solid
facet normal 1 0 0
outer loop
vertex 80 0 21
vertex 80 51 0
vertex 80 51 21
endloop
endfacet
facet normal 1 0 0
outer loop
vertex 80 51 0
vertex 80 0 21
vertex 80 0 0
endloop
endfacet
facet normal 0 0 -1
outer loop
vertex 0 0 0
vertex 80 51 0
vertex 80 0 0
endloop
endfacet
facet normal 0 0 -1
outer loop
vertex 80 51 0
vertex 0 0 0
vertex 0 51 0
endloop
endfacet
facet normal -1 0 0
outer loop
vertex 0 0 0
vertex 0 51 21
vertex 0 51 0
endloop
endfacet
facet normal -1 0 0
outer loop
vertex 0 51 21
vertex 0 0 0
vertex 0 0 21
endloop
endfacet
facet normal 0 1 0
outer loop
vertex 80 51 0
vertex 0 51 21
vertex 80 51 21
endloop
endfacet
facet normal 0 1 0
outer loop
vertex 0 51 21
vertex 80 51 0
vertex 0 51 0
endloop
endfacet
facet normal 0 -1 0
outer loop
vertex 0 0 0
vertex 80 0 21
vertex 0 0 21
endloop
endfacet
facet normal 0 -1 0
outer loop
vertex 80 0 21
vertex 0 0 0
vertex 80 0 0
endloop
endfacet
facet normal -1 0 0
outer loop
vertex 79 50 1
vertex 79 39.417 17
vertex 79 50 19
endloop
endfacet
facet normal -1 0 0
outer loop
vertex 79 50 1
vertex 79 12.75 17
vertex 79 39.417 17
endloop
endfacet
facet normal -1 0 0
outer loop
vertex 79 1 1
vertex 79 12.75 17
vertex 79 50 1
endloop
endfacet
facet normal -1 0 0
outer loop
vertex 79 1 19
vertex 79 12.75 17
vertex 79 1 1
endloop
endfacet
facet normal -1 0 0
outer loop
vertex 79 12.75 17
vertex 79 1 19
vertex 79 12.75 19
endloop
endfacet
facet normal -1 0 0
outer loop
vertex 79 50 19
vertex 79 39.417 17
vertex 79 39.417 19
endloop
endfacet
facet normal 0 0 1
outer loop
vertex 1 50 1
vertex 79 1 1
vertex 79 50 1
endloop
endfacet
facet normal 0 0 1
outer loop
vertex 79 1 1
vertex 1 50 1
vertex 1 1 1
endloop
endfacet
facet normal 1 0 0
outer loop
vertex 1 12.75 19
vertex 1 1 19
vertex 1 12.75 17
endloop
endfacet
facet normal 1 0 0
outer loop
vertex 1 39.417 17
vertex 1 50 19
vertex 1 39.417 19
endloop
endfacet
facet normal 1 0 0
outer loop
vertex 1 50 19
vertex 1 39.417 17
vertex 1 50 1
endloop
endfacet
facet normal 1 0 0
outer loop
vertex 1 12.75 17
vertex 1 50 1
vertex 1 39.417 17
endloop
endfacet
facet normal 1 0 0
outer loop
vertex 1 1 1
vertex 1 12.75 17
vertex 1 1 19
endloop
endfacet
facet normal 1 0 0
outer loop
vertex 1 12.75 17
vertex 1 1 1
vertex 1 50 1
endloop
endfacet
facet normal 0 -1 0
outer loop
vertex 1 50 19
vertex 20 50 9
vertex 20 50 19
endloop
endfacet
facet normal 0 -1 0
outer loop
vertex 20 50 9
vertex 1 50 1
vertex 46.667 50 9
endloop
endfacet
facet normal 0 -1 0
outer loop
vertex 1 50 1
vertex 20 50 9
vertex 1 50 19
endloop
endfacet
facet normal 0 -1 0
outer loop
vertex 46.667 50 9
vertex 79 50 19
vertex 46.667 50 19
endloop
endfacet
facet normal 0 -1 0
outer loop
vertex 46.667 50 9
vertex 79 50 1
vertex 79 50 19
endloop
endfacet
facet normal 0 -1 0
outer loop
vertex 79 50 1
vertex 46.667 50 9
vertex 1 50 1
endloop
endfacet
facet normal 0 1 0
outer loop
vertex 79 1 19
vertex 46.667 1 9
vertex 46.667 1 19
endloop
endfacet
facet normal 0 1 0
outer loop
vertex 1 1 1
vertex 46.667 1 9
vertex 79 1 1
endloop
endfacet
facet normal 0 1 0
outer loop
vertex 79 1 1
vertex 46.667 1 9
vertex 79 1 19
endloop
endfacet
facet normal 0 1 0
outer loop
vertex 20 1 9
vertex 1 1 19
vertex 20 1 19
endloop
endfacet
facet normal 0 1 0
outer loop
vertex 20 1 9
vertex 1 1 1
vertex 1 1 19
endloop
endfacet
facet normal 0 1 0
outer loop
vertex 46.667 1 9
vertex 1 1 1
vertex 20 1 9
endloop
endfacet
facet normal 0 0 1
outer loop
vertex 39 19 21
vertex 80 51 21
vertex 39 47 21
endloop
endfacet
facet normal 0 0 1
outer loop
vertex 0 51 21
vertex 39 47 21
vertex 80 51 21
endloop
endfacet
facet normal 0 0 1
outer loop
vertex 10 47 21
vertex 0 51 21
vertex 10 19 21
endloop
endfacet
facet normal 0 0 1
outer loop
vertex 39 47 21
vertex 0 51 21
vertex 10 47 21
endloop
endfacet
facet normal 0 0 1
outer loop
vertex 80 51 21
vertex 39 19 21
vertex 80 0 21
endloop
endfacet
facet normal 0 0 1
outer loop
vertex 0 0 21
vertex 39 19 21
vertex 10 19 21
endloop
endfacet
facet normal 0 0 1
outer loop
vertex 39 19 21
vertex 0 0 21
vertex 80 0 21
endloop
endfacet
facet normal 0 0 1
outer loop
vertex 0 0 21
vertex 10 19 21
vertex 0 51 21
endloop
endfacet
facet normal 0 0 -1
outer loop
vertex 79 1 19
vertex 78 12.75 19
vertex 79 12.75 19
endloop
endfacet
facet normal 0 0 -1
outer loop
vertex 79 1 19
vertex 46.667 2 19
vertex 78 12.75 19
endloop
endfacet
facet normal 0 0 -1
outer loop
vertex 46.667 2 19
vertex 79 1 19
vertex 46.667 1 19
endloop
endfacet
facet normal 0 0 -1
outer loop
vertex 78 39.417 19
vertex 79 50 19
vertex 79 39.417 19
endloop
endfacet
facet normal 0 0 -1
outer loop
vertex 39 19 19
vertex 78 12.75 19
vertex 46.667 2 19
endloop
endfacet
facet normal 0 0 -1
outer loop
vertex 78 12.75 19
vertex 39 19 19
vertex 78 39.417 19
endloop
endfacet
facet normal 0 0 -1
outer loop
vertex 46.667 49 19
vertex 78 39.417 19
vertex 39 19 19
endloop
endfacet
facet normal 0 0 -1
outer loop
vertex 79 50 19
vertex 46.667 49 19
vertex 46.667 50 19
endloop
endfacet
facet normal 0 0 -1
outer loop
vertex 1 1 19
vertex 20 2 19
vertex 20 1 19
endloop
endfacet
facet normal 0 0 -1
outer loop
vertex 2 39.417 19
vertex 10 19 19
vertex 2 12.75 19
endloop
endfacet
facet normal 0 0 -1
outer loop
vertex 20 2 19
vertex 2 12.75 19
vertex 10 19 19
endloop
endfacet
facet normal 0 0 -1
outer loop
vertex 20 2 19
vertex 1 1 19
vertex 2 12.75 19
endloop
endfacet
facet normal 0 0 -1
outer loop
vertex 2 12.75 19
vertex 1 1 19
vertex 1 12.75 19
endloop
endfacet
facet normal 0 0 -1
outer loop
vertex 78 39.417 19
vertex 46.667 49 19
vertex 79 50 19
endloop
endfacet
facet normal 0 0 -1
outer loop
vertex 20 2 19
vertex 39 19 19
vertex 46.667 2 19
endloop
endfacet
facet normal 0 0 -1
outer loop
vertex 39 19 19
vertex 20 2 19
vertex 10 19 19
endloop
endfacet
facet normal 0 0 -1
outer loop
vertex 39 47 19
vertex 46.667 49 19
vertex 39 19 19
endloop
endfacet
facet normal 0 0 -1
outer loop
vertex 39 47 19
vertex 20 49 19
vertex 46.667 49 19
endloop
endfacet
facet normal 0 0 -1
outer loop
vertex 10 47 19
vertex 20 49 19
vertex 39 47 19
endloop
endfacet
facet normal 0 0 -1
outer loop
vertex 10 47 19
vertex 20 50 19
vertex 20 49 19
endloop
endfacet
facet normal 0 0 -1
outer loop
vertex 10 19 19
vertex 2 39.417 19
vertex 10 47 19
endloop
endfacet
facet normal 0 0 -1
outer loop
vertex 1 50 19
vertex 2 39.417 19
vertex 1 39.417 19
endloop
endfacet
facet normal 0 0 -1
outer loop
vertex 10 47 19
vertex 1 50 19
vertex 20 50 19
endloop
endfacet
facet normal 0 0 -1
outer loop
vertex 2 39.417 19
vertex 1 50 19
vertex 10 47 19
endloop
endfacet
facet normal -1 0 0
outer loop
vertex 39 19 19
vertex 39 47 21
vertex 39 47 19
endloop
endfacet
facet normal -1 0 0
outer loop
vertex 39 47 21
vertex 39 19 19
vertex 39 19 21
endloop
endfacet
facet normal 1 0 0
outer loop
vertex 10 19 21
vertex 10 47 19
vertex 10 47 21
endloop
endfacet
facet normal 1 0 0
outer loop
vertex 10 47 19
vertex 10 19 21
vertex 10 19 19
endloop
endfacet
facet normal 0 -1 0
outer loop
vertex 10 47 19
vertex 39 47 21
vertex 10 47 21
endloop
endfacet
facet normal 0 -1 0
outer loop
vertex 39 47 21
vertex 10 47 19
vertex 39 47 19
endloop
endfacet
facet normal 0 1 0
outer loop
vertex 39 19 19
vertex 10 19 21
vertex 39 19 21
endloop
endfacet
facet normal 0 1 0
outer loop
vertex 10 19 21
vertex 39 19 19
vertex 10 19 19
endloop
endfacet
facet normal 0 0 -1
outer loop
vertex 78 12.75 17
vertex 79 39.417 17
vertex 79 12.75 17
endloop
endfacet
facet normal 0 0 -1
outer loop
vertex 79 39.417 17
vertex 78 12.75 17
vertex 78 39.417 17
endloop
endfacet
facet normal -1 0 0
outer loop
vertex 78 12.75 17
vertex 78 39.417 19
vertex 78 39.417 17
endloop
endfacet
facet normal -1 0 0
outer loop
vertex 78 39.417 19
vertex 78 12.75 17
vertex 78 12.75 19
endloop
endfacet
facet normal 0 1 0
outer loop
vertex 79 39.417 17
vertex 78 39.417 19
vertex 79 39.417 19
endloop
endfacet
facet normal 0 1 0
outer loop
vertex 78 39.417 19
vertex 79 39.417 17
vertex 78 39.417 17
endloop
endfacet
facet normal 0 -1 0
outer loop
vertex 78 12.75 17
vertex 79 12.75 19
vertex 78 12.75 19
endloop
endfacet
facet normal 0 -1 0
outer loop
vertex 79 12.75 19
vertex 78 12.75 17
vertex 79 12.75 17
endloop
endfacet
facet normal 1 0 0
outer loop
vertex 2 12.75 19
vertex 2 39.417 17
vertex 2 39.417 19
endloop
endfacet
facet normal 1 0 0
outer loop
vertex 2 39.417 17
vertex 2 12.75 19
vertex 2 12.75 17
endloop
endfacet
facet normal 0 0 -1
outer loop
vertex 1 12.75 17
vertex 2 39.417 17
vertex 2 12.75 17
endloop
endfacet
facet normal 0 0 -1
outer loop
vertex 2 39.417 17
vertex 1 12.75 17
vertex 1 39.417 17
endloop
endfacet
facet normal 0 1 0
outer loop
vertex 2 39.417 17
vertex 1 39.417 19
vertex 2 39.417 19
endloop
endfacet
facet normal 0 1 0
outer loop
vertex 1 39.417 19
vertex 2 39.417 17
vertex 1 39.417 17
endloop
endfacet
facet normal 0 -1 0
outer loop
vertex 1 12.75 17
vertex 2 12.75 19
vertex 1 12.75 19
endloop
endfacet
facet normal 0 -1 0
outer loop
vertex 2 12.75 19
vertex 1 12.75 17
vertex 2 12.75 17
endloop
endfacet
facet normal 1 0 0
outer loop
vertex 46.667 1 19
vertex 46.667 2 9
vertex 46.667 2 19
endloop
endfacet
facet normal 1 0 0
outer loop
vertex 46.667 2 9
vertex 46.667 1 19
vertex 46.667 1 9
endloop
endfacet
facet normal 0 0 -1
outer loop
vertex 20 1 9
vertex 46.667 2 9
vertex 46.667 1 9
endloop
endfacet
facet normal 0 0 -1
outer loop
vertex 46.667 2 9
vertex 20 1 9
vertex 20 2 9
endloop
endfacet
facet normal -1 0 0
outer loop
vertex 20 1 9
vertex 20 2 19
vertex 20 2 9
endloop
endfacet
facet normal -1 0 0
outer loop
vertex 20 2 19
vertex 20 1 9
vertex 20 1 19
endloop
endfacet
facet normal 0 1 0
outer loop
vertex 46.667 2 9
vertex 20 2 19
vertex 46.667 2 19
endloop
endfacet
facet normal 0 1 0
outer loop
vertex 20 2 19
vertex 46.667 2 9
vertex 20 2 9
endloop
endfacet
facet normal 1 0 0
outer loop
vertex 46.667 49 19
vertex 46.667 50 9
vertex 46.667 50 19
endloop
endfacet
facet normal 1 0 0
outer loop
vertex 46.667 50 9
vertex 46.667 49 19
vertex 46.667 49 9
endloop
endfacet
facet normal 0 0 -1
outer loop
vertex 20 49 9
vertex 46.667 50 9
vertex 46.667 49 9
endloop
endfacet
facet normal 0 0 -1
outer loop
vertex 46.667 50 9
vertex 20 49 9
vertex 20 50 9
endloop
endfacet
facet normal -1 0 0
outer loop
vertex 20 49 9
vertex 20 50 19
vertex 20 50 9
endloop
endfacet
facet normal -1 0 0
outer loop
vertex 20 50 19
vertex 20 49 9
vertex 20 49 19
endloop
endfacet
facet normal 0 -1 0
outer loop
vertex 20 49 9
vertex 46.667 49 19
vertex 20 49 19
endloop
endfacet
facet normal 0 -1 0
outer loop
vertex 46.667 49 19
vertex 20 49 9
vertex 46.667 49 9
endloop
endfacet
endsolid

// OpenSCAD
pbox=20; //profondeur
hbox=80; //hauteur
lbox=51; //largeur
ebox=1; //epaisseur
hscreen=29;
lscreen=28;
pibox=19; //profondeur interrieure
hibox=hbox-ebox*2;
libox=lbox-ebox*2;

difference() {
    cube([hbox,lbox,pbox]); 
translate([ebox,ebox,ebox]) 
    cube([hibox,libox,pibox]);  
}

union() {
difference() {
 union() {
translate ([0,0,pbox])    cube([hbox,lbox,ebox]);
translate ([ebox,ebox,pibox])cube([hibox,libox,ebox]);
 }
 
// 30 pour le cadre + 3 de decalage a gauche
translate ([10,lbox-32,pibox]) cube([hscreen,lscreen,pibox]);
//distance bord 3milli
 }
translate([hibox,lbox/4,pibox-2]) cube([1,hbox/3,2]);
 translate([ebox,lbox/4,pibox-2]) cube([1,hbox/3,2]);
 translate([hbox/4,ebox,pibox-10]) cube([hbox/3,1,10]);
 translate([hbox/4,libox,pibox-10]) cube([hbox/3,1,10]);
}
